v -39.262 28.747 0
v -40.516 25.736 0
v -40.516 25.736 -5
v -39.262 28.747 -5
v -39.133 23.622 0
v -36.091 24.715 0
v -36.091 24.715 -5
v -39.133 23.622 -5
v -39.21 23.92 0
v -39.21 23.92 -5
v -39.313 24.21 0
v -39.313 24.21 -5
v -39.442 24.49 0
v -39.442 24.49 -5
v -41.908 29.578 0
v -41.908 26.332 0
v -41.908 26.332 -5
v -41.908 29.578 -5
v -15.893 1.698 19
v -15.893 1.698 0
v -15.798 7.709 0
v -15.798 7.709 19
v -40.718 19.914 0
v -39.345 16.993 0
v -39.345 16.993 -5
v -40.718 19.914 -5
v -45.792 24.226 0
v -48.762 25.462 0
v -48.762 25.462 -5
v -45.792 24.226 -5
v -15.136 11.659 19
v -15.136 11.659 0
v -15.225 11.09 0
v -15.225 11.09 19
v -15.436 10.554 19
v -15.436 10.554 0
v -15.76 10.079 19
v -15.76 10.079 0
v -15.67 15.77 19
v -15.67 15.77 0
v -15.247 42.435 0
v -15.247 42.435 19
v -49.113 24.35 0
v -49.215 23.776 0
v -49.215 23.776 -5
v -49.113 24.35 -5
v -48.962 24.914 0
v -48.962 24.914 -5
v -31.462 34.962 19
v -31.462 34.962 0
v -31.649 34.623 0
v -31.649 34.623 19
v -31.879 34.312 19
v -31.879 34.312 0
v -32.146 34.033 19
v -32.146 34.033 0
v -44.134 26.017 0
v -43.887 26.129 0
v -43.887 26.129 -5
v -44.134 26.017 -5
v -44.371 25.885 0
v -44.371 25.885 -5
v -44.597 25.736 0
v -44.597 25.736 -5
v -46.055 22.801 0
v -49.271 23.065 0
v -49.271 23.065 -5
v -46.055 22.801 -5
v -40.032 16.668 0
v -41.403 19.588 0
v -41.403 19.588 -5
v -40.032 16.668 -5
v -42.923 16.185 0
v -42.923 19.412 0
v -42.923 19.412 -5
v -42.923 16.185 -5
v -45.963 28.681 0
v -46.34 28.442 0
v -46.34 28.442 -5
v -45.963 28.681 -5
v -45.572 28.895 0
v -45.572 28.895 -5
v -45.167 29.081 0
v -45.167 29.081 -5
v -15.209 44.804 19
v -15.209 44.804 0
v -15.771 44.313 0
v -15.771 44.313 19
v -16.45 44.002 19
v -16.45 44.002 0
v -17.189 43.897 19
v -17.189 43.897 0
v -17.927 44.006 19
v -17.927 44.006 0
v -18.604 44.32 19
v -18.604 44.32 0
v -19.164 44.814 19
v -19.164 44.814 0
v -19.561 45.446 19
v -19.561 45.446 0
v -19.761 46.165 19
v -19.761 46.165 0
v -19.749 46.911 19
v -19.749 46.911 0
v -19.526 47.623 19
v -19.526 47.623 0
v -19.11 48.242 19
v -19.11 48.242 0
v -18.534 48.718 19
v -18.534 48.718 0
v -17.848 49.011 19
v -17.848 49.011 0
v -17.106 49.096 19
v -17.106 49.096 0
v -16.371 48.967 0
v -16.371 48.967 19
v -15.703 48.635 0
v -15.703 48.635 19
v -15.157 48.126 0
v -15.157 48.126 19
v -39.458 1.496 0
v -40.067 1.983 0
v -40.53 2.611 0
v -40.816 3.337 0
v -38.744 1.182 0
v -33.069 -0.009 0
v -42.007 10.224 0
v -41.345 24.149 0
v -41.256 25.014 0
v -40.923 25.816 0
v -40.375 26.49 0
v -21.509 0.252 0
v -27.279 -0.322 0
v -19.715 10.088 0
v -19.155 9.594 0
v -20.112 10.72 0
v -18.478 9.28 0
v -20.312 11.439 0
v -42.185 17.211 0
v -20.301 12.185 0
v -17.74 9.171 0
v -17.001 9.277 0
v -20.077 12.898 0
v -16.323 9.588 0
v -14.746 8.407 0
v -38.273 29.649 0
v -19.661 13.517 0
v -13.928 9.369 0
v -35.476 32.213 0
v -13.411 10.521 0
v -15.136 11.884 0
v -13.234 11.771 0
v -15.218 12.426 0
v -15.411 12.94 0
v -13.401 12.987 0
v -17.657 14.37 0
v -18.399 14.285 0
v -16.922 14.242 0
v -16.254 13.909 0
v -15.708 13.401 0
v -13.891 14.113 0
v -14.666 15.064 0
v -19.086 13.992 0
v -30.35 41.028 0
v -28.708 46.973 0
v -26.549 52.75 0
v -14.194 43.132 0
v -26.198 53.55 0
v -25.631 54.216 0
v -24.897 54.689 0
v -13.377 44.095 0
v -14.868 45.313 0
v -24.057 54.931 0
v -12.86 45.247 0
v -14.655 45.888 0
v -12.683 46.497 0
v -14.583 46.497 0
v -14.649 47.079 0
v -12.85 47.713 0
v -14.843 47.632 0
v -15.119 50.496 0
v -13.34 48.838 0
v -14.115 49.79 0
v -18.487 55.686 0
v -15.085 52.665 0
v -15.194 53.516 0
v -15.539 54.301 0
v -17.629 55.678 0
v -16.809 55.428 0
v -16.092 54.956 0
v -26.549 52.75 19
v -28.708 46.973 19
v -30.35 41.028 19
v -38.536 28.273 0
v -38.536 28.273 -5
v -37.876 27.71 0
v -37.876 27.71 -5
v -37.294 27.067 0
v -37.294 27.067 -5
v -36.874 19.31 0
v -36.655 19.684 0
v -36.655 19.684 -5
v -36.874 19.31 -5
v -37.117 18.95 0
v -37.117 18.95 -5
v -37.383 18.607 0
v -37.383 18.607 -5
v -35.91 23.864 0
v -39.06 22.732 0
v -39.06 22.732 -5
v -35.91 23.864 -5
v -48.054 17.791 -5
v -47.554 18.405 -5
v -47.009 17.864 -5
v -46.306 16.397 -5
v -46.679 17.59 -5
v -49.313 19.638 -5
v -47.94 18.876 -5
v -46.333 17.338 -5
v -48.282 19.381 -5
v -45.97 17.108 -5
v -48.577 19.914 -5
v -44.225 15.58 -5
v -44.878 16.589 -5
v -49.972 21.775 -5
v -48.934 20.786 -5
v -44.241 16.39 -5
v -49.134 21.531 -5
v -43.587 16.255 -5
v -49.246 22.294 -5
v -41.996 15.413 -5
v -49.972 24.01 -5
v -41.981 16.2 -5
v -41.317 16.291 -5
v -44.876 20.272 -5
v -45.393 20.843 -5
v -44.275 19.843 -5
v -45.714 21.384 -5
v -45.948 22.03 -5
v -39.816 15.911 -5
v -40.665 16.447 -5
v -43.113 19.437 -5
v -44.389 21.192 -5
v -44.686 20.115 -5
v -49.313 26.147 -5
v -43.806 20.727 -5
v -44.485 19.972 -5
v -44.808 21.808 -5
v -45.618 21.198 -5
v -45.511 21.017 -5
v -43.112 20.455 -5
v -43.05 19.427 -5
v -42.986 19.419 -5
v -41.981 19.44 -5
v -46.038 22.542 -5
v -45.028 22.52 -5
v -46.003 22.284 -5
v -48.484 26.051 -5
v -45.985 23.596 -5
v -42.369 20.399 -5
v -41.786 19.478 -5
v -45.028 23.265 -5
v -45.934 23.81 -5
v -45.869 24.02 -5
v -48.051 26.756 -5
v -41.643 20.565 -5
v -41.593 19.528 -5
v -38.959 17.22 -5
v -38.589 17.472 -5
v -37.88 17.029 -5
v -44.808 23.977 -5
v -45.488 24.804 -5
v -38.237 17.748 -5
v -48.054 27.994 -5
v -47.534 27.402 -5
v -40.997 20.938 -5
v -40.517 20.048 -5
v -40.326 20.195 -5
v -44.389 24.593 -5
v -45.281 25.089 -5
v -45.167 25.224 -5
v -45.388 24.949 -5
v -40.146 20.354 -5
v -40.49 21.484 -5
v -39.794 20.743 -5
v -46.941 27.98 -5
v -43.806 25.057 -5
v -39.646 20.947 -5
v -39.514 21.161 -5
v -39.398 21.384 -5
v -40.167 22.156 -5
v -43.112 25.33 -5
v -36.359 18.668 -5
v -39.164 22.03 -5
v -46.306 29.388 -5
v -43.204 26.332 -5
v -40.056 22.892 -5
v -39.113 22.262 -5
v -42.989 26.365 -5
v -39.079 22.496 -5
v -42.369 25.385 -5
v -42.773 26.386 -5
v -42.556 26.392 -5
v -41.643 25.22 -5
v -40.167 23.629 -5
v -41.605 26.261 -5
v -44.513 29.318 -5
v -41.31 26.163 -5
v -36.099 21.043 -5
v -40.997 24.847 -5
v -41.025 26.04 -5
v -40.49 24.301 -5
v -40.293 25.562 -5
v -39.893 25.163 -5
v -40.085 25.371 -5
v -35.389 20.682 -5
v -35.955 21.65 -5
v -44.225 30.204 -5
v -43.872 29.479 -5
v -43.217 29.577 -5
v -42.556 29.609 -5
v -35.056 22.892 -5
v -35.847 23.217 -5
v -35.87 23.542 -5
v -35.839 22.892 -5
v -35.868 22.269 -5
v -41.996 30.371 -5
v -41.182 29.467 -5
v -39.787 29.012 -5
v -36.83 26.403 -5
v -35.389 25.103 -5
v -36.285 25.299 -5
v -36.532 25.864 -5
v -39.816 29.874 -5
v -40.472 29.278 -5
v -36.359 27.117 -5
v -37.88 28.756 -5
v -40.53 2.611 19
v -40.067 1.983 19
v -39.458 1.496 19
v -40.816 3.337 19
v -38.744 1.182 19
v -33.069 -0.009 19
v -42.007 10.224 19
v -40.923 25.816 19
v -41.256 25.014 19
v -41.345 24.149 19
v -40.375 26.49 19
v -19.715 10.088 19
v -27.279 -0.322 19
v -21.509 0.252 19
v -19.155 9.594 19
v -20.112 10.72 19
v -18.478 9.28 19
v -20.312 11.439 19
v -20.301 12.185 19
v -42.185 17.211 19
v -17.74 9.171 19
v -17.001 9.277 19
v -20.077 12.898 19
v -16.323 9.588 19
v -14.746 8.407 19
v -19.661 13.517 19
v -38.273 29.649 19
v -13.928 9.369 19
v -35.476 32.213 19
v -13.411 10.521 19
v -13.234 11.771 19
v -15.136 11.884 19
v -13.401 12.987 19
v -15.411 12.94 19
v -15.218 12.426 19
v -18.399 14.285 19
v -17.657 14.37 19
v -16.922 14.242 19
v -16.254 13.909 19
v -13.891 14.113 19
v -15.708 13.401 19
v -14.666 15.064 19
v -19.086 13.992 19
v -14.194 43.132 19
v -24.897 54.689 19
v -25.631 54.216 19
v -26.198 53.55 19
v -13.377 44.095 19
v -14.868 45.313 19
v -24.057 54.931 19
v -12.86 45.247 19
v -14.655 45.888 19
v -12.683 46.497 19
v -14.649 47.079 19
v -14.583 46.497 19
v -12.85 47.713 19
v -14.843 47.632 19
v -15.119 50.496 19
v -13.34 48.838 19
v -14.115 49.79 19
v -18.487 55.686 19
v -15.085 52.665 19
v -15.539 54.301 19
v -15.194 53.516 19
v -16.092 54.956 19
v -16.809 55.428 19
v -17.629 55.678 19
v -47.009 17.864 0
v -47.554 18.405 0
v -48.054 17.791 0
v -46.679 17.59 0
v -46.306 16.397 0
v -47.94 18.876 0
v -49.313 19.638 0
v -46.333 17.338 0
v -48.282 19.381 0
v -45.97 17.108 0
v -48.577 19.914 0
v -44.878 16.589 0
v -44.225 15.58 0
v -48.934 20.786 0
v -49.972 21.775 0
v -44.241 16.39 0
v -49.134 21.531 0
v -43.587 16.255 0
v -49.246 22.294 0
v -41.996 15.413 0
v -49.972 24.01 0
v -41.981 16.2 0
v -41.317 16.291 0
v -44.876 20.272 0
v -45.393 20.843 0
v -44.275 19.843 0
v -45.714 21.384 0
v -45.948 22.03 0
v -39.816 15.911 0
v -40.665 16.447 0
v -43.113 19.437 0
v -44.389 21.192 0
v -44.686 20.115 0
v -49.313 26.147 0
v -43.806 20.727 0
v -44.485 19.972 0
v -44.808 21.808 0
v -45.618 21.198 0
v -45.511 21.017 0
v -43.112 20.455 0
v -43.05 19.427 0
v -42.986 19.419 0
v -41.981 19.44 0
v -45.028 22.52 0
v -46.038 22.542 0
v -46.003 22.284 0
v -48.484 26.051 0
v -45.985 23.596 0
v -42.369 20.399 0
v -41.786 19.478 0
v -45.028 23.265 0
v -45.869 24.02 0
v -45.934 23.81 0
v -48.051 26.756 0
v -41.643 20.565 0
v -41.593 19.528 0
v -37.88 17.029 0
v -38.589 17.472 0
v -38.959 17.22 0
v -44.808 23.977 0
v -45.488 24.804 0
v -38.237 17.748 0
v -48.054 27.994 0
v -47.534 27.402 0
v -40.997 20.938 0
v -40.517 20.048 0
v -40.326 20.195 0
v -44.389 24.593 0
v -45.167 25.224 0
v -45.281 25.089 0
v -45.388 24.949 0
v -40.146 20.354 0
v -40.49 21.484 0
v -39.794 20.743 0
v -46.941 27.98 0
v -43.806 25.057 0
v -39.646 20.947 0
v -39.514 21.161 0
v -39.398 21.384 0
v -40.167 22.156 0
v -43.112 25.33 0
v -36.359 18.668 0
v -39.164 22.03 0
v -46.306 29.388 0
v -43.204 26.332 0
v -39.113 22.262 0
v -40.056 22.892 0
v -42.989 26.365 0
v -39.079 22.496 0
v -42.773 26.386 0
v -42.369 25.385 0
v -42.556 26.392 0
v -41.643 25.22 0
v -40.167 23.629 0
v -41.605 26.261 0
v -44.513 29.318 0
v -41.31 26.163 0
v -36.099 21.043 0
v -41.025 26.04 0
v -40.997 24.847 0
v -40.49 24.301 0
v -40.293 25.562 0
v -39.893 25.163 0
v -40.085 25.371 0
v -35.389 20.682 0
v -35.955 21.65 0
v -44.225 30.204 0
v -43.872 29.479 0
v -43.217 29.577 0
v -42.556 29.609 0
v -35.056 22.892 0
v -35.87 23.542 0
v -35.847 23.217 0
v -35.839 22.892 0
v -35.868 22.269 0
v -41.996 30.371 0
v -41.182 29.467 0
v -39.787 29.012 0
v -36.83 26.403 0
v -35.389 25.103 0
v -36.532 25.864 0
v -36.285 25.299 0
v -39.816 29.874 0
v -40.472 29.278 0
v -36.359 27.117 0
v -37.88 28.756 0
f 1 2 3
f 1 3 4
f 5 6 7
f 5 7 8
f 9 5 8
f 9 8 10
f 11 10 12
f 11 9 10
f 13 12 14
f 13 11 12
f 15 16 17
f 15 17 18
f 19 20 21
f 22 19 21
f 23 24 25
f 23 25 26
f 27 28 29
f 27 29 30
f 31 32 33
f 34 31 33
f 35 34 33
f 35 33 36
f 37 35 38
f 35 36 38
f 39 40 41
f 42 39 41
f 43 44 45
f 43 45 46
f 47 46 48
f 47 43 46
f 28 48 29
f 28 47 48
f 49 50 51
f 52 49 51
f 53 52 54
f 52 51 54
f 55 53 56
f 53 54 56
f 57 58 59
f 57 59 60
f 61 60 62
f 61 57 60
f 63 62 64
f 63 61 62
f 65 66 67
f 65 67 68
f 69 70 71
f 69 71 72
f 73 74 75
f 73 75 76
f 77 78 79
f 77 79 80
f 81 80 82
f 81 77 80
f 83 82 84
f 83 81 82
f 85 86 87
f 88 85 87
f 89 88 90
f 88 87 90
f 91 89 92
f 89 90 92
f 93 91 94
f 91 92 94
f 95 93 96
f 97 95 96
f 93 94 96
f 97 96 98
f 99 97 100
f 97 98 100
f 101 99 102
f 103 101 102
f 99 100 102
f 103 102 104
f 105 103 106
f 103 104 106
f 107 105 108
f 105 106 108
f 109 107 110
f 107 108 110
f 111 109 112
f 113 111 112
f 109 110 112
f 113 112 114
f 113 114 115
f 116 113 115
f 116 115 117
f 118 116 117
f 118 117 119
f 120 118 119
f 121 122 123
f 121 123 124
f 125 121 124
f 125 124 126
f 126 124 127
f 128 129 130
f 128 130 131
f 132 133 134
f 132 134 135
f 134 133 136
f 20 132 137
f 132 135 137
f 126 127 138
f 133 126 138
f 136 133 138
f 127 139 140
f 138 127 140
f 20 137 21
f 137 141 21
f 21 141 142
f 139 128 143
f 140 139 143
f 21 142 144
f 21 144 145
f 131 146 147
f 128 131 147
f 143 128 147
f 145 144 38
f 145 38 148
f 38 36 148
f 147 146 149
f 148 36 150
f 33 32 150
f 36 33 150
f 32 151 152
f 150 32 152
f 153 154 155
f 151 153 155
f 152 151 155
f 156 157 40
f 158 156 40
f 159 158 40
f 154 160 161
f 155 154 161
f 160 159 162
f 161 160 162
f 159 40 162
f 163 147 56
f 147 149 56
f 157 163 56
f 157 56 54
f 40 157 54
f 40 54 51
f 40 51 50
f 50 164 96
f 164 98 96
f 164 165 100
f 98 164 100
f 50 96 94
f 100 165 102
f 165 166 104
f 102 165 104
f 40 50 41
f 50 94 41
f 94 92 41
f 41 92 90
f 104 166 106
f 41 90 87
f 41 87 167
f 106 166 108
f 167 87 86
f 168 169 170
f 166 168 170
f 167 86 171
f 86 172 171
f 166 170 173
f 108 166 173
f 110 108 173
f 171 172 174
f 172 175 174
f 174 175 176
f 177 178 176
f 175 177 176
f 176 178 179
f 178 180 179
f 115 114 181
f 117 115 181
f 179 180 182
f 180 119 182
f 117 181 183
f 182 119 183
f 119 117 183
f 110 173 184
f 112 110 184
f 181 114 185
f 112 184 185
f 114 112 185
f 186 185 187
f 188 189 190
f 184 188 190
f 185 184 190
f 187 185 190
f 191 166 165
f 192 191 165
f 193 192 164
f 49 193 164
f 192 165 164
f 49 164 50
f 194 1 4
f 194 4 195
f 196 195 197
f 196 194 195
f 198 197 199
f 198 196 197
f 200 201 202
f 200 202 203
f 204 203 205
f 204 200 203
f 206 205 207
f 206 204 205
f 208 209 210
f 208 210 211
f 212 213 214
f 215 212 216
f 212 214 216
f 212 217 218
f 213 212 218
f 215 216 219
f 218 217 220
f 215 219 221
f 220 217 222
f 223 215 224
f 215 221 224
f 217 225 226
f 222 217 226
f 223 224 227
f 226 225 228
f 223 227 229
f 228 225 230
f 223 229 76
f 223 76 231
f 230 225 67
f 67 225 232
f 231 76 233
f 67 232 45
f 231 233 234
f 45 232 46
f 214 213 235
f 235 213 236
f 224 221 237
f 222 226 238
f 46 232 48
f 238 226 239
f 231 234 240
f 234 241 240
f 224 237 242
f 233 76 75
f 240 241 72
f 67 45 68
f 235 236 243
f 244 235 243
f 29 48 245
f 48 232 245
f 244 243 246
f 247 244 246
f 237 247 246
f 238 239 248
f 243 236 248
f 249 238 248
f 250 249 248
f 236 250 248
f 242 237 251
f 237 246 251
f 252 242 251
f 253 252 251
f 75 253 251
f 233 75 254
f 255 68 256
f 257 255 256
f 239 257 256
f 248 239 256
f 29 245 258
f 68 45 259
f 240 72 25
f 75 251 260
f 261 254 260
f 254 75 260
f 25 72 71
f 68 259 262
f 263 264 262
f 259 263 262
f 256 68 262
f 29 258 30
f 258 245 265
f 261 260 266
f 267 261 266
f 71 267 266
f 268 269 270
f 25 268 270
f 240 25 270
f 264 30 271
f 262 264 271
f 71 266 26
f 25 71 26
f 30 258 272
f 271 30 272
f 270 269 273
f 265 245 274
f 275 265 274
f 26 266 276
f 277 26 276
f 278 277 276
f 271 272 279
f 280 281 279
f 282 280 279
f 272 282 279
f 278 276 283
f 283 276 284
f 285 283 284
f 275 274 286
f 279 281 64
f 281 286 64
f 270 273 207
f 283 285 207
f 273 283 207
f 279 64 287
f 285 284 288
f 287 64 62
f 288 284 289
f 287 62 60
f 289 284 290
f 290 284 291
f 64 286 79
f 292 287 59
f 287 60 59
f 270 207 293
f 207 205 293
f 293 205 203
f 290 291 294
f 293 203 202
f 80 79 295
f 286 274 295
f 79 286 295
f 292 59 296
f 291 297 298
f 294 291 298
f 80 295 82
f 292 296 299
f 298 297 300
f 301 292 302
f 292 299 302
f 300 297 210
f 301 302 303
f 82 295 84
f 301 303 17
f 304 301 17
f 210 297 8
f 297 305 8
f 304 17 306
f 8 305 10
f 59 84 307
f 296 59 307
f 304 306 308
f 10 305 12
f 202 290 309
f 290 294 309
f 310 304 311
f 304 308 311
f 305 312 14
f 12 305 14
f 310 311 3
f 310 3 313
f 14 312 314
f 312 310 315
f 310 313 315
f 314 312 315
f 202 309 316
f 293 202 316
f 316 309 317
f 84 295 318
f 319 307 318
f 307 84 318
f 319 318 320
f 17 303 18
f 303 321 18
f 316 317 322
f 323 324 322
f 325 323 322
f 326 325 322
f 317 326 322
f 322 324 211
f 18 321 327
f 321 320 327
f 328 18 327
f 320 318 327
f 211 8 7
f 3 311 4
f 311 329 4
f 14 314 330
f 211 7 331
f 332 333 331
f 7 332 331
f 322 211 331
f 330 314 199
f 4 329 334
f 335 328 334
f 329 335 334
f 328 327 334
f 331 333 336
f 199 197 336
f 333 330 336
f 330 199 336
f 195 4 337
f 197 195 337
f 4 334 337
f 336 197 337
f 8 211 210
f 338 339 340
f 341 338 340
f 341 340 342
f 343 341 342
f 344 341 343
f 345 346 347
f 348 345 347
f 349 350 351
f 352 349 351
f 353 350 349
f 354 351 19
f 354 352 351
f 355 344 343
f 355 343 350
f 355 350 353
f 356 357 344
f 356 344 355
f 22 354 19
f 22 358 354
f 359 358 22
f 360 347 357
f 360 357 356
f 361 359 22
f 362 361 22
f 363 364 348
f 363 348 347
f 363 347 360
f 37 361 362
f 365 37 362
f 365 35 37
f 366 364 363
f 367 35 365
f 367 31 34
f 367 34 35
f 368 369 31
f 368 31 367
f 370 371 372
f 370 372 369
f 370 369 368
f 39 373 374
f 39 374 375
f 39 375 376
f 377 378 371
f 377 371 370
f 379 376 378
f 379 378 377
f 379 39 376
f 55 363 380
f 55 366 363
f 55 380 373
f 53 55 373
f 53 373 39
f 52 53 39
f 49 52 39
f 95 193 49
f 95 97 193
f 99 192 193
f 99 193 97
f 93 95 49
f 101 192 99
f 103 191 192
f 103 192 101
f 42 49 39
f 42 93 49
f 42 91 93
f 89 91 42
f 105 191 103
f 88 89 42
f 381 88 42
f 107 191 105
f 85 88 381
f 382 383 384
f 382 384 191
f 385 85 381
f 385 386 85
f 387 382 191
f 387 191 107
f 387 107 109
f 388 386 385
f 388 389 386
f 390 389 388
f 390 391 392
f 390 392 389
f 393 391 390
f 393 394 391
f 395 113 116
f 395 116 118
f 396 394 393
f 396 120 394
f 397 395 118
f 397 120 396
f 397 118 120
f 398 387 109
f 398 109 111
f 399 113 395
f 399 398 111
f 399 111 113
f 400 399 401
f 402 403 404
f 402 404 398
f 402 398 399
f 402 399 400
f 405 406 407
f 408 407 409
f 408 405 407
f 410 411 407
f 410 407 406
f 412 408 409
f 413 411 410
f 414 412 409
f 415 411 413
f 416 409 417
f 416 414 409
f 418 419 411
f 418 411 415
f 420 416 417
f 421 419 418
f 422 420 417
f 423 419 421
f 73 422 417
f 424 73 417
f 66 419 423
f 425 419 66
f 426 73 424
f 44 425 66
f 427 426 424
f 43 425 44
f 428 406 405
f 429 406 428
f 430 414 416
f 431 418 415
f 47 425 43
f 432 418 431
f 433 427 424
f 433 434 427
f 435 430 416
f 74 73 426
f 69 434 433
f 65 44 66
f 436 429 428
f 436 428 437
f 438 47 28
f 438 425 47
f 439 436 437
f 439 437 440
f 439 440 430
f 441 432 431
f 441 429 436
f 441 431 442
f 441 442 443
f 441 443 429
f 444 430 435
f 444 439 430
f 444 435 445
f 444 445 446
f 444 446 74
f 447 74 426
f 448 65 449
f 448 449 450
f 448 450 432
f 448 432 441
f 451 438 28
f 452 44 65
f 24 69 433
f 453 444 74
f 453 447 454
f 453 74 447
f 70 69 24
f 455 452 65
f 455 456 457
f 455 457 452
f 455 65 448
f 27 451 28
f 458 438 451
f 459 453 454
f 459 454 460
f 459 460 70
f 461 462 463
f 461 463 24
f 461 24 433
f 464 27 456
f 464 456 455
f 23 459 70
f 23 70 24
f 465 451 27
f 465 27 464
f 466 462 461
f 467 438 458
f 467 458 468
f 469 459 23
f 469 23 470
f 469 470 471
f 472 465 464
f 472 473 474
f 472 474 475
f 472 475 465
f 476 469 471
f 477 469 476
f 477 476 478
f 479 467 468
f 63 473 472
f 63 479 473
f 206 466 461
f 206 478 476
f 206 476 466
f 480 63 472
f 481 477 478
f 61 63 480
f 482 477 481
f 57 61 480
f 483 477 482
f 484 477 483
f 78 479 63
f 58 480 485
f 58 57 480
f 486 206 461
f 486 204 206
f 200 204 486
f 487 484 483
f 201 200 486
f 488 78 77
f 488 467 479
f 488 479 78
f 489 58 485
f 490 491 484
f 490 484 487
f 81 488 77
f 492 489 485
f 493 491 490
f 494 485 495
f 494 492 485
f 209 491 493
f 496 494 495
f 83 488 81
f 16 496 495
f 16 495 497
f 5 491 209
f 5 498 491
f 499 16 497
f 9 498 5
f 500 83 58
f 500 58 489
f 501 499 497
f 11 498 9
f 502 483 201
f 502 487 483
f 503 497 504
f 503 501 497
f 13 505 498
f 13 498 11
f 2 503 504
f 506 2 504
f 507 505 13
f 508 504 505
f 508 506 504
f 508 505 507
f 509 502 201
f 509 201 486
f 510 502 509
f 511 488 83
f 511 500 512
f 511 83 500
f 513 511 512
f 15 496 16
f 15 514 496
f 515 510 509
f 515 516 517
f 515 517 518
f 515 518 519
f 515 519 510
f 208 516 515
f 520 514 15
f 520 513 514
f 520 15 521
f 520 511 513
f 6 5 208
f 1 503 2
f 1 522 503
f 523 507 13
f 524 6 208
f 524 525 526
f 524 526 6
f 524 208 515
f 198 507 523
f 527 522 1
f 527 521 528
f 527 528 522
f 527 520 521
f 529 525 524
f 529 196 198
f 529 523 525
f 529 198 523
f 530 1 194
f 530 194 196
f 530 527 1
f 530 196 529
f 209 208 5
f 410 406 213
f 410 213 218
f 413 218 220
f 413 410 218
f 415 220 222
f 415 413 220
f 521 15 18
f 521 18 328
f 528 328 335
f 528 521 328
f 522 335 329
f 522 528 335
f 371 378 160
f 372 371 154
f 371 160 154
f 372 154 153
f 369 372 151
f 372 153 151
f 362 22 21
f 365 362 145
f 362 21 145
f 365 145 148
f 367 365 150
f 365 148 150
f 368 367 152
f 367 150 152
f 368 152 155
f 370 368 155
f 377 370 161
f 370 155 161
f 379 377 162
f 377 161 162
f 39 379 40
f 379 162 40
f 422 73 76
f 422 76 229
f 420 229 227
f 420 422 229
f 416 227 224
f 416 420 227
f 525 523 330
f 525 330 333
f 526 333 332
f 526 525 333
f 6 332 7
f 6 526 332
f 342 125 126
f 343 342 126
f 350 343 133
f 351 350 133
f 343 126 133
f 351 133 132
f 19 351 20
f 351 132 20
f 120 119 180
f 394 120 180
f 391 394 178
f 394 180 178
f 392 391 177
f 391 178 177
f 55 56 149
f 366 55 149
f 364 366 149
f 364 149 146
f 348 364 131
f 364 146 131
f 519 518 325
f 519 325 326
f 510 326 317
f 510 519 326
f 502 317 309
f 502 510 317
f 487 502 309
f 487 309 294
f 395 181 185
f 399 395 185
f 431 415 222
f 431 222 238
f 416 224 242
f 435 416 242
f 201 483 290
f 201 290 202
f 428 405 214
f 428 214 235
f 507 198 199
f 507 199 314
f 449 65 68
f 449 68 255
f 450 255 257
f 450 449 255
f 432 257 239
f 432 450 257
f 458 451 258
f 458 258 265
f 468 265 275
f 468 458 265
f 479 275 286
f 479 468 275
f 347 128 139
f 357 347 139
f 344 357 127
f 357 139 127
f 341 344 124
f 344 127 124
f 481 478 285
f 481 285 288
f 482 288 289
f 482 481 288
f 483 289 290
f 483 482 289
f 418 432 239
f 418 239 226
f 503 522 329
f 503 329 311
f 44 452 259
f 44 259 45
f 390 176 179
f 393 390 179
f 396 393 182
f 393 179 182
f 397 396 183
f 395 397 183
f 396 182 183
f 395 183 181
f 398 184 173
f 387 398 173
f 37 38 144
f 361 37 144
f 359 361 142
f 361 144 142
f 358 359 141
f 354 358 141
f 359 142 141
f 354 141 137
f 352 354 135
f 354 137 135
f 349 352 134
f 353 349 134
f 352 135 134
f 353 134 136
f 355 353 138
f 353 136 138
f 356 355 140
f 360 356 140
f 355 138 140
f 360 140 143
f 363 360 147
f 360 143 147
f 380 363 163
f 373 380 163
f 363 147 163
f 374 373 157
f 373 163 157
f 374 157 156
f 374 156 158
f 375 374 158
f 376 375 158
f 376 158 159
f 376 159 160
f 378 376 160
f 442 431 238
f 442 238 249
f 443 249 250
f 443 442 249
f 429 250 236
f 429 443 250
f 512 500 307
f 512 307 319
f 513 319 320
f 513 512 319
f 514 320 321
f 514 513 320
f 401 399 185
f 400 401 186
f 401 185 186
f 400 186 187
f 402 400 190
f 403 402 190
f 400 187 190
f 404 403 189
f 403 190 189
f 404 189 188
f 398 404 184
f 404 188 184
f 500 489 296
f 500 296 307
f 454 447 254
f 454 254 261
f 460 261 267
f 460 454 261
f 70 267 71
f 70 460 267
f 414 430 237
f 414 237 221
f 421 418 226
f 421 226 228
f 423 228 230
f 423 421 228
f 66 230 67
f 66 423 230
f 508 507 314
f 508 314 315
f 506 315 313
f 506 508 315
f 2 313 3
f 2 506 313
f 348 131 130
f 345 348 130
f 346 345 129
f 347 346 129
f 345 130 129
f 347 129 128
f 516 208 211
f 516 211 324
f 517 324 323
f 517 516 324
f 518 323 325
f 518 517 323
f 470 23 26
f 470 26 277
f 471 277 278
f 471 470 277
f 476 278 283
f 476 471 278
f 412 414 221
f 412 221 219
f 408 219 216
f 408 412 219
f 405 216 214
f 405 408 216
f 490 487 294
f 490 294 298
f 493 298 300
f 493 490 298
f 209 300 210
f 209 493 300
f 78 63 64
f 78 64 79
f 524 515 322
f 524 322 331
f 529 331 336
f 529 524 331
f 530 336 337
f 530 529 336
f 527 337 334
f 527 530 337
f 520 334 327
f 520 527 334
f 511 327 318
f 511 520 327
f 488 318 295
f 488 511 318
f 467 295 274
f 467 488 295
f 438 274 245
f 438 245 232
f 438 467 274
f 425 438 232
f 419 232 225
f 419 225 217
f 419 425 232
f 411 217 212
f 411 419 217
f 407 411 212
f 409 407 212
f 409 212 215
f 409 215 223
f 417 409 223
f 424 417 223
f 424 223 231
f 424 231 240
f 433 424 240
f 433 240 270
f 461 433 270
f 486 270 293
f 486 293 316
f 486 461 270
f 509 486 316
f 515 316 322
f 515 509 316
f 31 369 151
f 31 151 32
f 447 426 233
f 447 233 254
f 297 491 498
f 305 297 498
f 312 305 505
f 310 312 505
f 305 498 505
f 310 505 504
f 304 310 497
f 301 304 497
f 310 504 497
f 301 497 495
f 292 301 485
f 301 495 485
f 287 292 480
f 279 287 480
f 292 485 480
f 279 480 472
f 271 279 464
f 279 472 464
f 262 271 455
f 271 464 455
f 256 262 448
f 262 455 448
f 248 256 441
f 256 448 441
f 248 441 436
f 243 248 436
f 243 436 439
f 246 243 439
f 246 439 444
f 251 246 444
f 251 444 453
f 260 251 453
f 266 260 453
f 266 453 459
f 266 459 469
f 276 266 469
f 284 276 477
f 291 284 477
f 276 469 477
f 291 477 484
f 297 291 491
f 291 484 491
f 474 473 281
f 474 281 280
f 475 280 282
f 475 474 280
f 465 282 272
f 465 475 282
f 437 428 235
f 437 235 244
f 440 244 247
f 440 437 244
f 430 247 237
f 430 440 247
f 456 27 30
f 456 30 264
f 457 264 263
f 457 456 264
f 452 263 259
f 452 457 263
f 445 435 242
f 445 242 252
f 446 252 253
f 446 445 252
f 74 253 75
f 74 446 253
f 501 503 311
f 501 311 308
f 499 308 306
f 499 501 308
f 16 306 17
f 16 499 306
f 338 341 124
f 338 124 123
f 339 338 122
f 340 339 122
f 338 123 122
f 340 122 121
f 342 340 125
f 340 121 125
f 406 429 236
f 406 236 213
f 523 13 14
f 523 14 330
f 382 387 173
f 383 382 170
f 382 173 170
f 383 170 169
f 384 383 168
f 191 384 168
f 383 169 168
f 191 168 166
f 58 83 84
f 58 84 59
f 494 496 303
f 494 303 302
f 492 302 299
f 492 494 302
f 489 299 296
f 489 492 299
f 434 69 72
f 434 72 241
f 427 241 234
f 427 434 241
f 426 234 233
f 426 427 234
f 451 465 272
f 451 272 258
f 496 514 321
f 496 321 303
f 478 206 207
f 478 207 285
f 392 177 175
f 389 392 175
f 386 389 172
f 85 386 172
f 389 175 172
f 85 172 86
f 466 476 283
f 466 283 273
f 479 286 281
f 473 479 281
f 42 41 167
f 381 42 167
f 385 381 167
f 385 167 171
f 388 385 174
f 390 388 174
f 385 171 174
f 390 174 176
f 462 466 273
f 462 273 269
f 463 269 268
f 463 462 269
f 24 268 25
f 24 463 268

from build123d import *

# Parameters (mm, degrees)
F1_DEPTH = 19
F2_R     = 7.5
F2_R_2   = 2.5
F3_DEPTH = 5


# Not quite as in the source:
# - a feature names something its author has since deleted; it is built from what else it names


with BuildPart() as f1:
    # F0 (on Top) → F1 (new body)
    with BuildSketch(Plane.XY):
        with BuildLine():
            Line((-18.4867138529, 55.6857541377), (-24.0573941449, 54.93137017))
            ThreePointArc((-24.0573941449, 54.93137017), (-25.6311486072, 54.2155115142), (-26.5485038183, 52.7500367996))
            ThreePointArc((-26.5485038183, 52.7500367996), (-29.5944451056, 44.0185448748), (-31.46174181, 34.9615082415))
            ThreePointArc((-31.46174181, 34.9615082415), (-31.7590054988, 34.4640245193), (-32.1463756641, 34.032979151))
            ThreePointArc((-32.1463756641, 34.032979151), (-36.9518125946, 31.0156700781), (-40.3745702721, 26.4900642606))
            ThreePointArc((-40.3745702721, 26.4900642606), (-41.1187881848, 25.4271596859), (-41.3445519166, 24.1494049466))
            ThreePointArc((-41.3445519166, 24.1494049466), (-42.2235056982, 13.7140274197), (-40.8158360427, 3.3367382737))
            ThreePointArc((-40.8158360427, 3.3367382737), (-40.0672712074, 1.9827956506), (-38.7436286277, 1.181871022))
            ThreePointArc((-38.7436286277, 1.181871022), (-27.2787715313, -0.3216500473), (-15.8934134801, 1.6975443206))
            Line((-15.8934134801, 1.6975443206), (-15.7980047108, 7.7090638021))
            ThreePointArc((-15.7980047108, 7.7090638021), (-22.2332162759, 11.8428335239), (-15.670064806, 15.7703063478))
            Line((-15.670064806, 15.7703063478), (-15.2468750991, 42.4346600078))
            ThreePointArc((-15.2468750991, 42.4346600078), (-21.6820866642, 46.5684297296), (-15.1189351942, 50.4959025535))
            Line((-15.1189351942, 50.4959025535), (-15.0845049847, 52.6652825485))
            ThreePointArc((-15.0845049847, 52.6652825485), (-16.0924041894, 54.9563331626), (-18.4867138529, 55.6857541377))
        make_face()
        with BuildLine():
            ThreePointArc((-12.6826533059, 46.4970192649), (-13.3396901586, 48.8383082793), (-15.1189351942, 50.4959025535))
            Line((-15.1189351942, 50.4959025535), (-15.1565415969, 48.1263968586))
            ThreePointArc((-15.1565415969, 48.1263968586), (-14.7303186587, 47.3607638906), (-14.5826533059, 46.4970192649))
            ThreePointArc((-14.5826533059, 46.4970192649), (-14.7443342143, 45.5944673231), (-15.2092686964, 44.8041657027))
            Line((-15.2092686964, 44.8041657027), (-15.2468750991, 42.4346600078))
            ThreePointArc((-15.2468750991, 42.4346600078), (-13.377327963, 44.0950411146), (-12.6826533059, 46.4970192649))
        make_face()
        with BuildLine():
            Line((-15.1565415969, 48.1263968586), (-15.1189351942, 50.4959025535))
            ThreePointArc((-15.1189351942, 50.4959025535), (-21.6820866642, 46.5684297296), (-15.2468750991, 42.4346600078))
            Line((-15.2468750991, 42.4346600078), (-15.2092686964, 44.8041657027))
            ThreePointArc((-15.2092686964, 44.8041657027), (-19.7823259129, 46.5382786445), (-15.1565415969, 48.1263968586))
        make_face()
        with BuildLine():
            Line((-15.7076712086, 13.4008006529), (-15.670064806, 15.7703063478))
            ThreePointArc((-15.670064806, 15.7703063478), (-22.2332162759, 11.8428335239), (-15.7980047108, 7.7090638021))
            Line((-15.7980047108, 7.7090638021), (-15.7603983081, 10.0785694971))
            ThreePointArc((-15.7603983081, 10.0785694971), (-20.3334555246, 11.8126824388), (-15.7076712086, 13.4008006529))
        make_face()
        with BuildLine():
            ThreePointArc((-13.2337829176, 11.7714230593), (-13.8908197703, 14.1127120736), (-15.670064806, 15.7703063478))
            Line((-15.670064806, 15.7703063478), (-15.7076712086, 13.4008006529))
            ThreePointArc((-15.7076712086, 13.4008006529), (-15.3007413769, 12.6881066805), (-15.1362247549, 11.8840800221))
            Line((-15.1362247549, 11.8840800221), (-15.1362247549, 11.6587660965))
            ThreePointArc((-15.1362247549, 11.6587660965), (-15.3155945916, 10.8162449502), (-15.7603983081, 10.0785694971))
            Line((-15.7603983081, 10.0785694971), (-15.7980047108, 7.7090638021))
            ThreePointArc((-15.7980047108, 7.7090638021), (-13.9284575747, 9.3694449089), (-13.2337829176, 11.7714230593))
        make_face()
    extrude(amount=F1_DEPTH)


with BuildPart() as f3:
    # F2 (on Top) → F3 (new body)
    with BuildSketch(Plane.XY):
        with Locations((-42.5560415272, 22.8924162194)):
            Circle(F2_R)
        with BuildLine():
            ThreePointArc((-36.829554944, 26.4032928604), (-36.4020595038, 25.5845173749), (-36.0909286598, 24.7148374079))
            ThreePointArc((-36.0909286598, 24.7148374079), (-35.9865291403, 24.2925627739), (-35.9096801821, 23.8644163459))
            ThreePointArc((-35.9096801821, 23.8644163459), (-35.8566790413, 23.3797001801), (-35.8389809069, 22.8924162194))
            ThreePointArc((-35.8389809069, 22.8924162194), (-35.9042334364, 21.9584180933), (-36.0987232404, 21.0425665179))
            ThreePointArc((-36.0987232404, 21.0425665179), (-36.3395382025, 20.3480125978), (-36.6548093118, 19.6839334447))
            ThreePointArc((-36.6548093118, 19.6839334447), (-36.992942718, 19.1279992639), (-37.3832803945, 18.6073904739))
            ThreePointArc((-37.3832803945, 18.6073904739), (-37.7906796134, 18.1584718591), (-38.2368936112, 17.7481121212))
            ThreePointArc((-38.2368936112, 17.7481121212), (-38.7721055408, 17.3425755167), (-39.3451335754, 16.9925032116))
            ThreePointArc((-39.3451335754, 16.9925032116), (-39.6838378223, 16.8204026117), (-40.0317304914, 16.6677268962))
            ThreePointArc((-40.0317304914, 16.6677268962), (-40.9887550369, 16.3607612658), (-41.9808680572, 16.2000265973))
            ThreePointArc((-41.9808680572, 16.2000265973), (-42.4514489154, 16.1761699642), (-42.9225444398, 16.1853617996))
            ThreePointArc((-42.9225444398, 16.1853617996), (-43.9153904074, 16.3143409692), (-44.8780365625, 16.589461164))
            ThreePointArc((-44.8780365625, 16.589461164), (-45.435948651, 16.8240524916), (-45.9704801387, 17.1079099879))
            ThreePointArc((-45.9704801387, 17.1079099879), (-46.5079882683, 17.4609320456), (-47.0092746326, 17.8637366429))
            ThreePointArc((-47.0092746326, 17.8637366429), (-47.2892940825, 18.1263671615), (-47.5538518611, 18.4045664847))
            ThreePointArc((-47.5538518611, 18.4045664847), (-48.116773764, 19.1245042824), (-48.5767615095, 19.9141895206))
            ThreePointArc((-48.5767615095, 19.9141895206), (-48.7708001482, 20.3437540886), (-48.9342357685, 20.7858689034))
            ThreePointArc((-48.9342357685, 20.7858689034), (-49.2009974057, 21.910853818), (-49.2708867143, 23.0649198099))
            ThreePointArc((-49.2708867143, 23.0649198099), (-49.2522737571, 23.4209777562), (-49.2147939886, 23.7755464664))
            ThreePointArc((-49.2147939886, 23.7755464664), (-49.043482284, 24.6336846657), (-48.7620670518, 25.4622704105))
            ThreePointArc((-48.7620670518, 25.4622704105), (-48.630264893, 25.7599437045), (-48.4841948015, 26.0508813738))
            ThreePointArc((-48.4841948015, 26.0508813738), (-47.8022969745, 27.0871399477), (-46.9414713871, 27.9803340961))
            ThreePointArc((-46.9414713871, 27.9803340961), (-46.6471161076, 28.2198933102), (-46.3397008388, 28.4424455517))
            ThreePointArc((-46.3397008388, 28.4424455517), (-45.76910866, 28.7911536246), (-45.1666718224, 29.0813994023))
            ThreePointArc((-45.1666718224, 29.0813994023), (-44.8430367604, 29.2081549869), (-44.5132782297, 29.3180000735))
            ThreePointArc((-44.5132782297, 29.3180000735), (-43.5454522375, 29.536208045), (-42.5560415272, 29.6094768397))
            ThreePointArc((-42.5560415272, 29.6094768397), (-42.231677867, 29.6016405853), (-41.9080710248, 29.5781501061))
            ThreePointArc((-41.9080710248, 29.5781501061), (-40.8244371879, 29.3824431676), (-39.7873399477, 29.012317766))
            ThreePointArc((-39.7873399477, 29.012317766), (-39.5219662451, 28.8851860764), (-39.2624151007, 28.7465539304))
            ThreePointArc((-39.2624151007, 28.7465539304), (-38.1965318152, 28.0025608795), (-37.2939053957, 27.0672008498))
            ThreePointArc((-37.2939053957, 27.0672008498), (-37.0517113458, 26.7422542199), (-36.829554944, 26.4032928604))
        make_face(mode=Mode.SUBTRACT)
        with BuildLine():
            Line((-36.0987232404, 21.0425665179), (-39.1638805296, 22.0303003532))
            ThreePointArc((-39.1638805296, 22.0303003532), (-39.2648640734, 21.7015547799), (-39.3976232849, 21.3843067384))
            Line((-39.3976232849, 21.3843067384), (-36.6548093118, 19.6839334447))
            ThreePointArc((-36.6548093118, 19.6839334447), (-36.3395382025, 20.3480125978), (-36.0987232404, 21.0425665179))
        make_face()
        with BuildLine():
            ThreePointArc((-39.132827379, 23.6215286224), (-39.0752909243, 23.2589885054), (-39.0560415272, 22.8924162194))
            ThreePointArc((-39.0560415272, 22.8924162194), (-39.0569583824, 22.8123091265), (-39.0597084679, 22.732244003))
            Line((-39.0597084679, 22.732244003), (-35.9096801821, 23.8644163459))
            ThreePointArc((-35.9096801821, 23.8644163459), (-35.9865291403, 24.2925627739), (-36.0909286598, 24.7148374079))
            Line((-36.0909286598, 24.7148374079), (-39.132827379, 23.6215286224))
        make_face()
        with BuildLine():
            ThreePointArc((-39.8927436716, 25.163284893), (-39.6476626206, 24.8395505589), (-39.4417244656, 24.4896103968))
            Line((-39.4417244656, 24.4896103968), (-36.829554944, 26.4032928604))
            ThreePointArc((-36.829554944, 26.4032928604), (-37.0517113458, 26.7422542199), (-37.2939053957, 27.0672008498))
            Line((-37.2939053957, 27.0672008498), (-39.8927436716, 25.163284893))
        make_face()
        with BuildLine():
            ThreePointArc((-39.0597084679, 22.732244003), (-39.0569583824, 22.8123091265), (-39.0560415272, 22.8924162194))
            ThreePointArc((-39.0560415272, 22.8924162194), (-39.0752909243, 23.2589885054), (-39.132827379, 23.6215286224))
            ThreePointArc((-39.132827379, 23.6215286224), (-39.2585849208, 24.0657788782), (-39.4417244656, 24.4896103968))
            ThreePointArc((-39.4417244656, 24.4896103968), (-39.6476626206, 24.8395505589), (-39.8927436716, 25.163284893))
            ThreePointArc((-39.8927436716, 25.163284893), (-40.1868435925, 25.4686346004), (-40.515704619, 25.7361857779))
            ThreePointArc((-40.515704619, 25.7361857779), (-40.763863783, 25.8987593358), (-41.024899288, 26.0397330836))
            ThreePointArc((-41.024899288, 26.0397330836), (-41.4567348008, 26.2152952003), (-41.9080710248, 26.3319124366))
            ThreePointArc((-41.9080710248, 26.3319124366), (-42.2306469668, 26.3772574468), (-42.5560415272, 26.3924162194))
            ThreePointArc((-42.5560415272, 26.3924162194), (-42.8814360875, 26.3772574468), (-43.2040120295, 26.3319124366))
            ThreePointArc((-43.2040120295, 26.3319124366), (-43.5508479772, 26.2480622268), (-43.8873439447, 26.1293335606))
            ThreePointArc((-43.8873439447, 26.1293335606), (-44.2536485399, 25.9531563963), (-44.5970572739, 25.7356986046))
            ThreePointArc((-44.5970572739, 25.7356986046), (-44.8959140549, 25.4952985745), (-45.1666718224, 25.2236411038))
            ThreePointArc((-45.1666718224, 25.2236411038), (-45.3353778089, 25.0196890822), (-45.4881886835, 24.8035711199))
            ThreePointArc((-45.4881886835, 24.8035711199), (-45.6536452917, 24.5217875454), (-45.7921014478, 24.2258014563))
            ThreePointArc((-45.7921014478, 24.2258014563), (-45.9031313374, 23.9156414157), (-45.9845082279, 23.5964162775))
            ThreePointArc((-45.9845082279, 23.5964162775), (-46.0424319056, 23.2007701216), (-46.0548500683, 22.8010992291))
            ThreePointArc((-46.0548500683, 22.8010992291), (-46.0230139848, 22.4127267598), (-45.9482025247, 22.0303003532))
            ThreePointArc((-45.9482025247, 22.0303003532), (-45.8472189809, 21.7015547799), (-45.7144597694, 21.3843067384))
            ThreePointArc((-45.7144597694, 21.3843067384), (-45.5661116717, 21.1065053244), (-45.3933928705, 20.8431633424))
            ThreePointArc((-45.3933928705, 20.8431633424), (-45.1504482326, 20.543149558), (-44.875940706, 20.2717163511))
            ThreePointArc((-44.875940706, 20.2717163511), (-44.5866141985, 20.0416663836), (-44.2746392941, 19.8434128224))
            ThreePointArc((-44.2746392941, 19.8434128224), (-43.7117052617, 19.5887150628), (-43.112755495, 19.4369756458))
            ThreePointArc((-43.112755495, 19.4369756458), (-43.0178235038, 19.4230131864), (-42.9225444398, 19.4116583113))
            ThreePointArc((-42.9225444398, 19.4116583113), (-42.4507482802, 19.3940003877), (-41.9808680572, 19.4400003292))
            ThreePointArc((-41.9808680572, 19.4400003292), (-41.6889373989, 19.501526892), (-41.4033071565, 19.5876918027))
            ThreePointArc((-41.4033071565, 19.5876918027), (-41.0515300083, 19.7322825056), (-40.7175188239, 19.9141895206))
            ThreePointArc((-40.7175188239, 19.9141895206), (-40.4204666328, 20.1194539279), (-40.1461427954, 20.3542302328))
            ThreePointArc((-40.1461427954, 20.3542302328), (-39.9626809244, 20.5419948138), (-39.7938083043, 20.742981963))
            ThreePointArc((-39.7938083043, 20.742981963), (-39.5783993711, 21.0529469508), (-39.3976232849, 21.3843067384))
            ThreePointArc((-39.3976232849, 21.3843067384), (-39.2648640734, 21.7015547799), (-39.1638805296, 22.0303003532))
            ThreePointArc((-39.1638805296, 22.0303003532), (-39.0939585105, 22.3786252254), (-39.0597084679, 22.732244003))
        make_face()
        with Locations((-42.5560415272, 22.8924162194)):
            Circle(F2_R_2, mode=Mode.SUBTRACT)
        with BuildLine():
            ThreePointArc((-41.024899288, 26.0397330836), (-40.763863783, 25.8987593358), (-40.515704619, 25.7361857779))
            Line((-40.515704619, 25.7361857779), (-39.2624151007, 28.7465539304))
            ThreePointArc((-39.2624151007, 28.7465539304), (-39.5219662451, 28.8851860764), (-39.7873399477, 29.012317766))
            Line((-39.7873399477, 29.012317766), (-41.024899288, 26.0397330836))
        make_face()
        with BuildLine():
            ThreePointArc((-43.8873439447, 26.1293335606), (-43.5508479772, 26.2480622268), (-43.2040120295, 26.3319124366))
            Line((-43.2040120295, 26.3319124366), (-44.5132782297, 29.3180000735))
            ThreePointArc((-44.5132782297, 29.3180000735), (-44.8430367604, 29.2081549869), (-45.1666718224, 29.0813994023))
            Line((-45.1666718224, 29.0813994023), (-43.8873439447, 26.1293335606))
        make_face()
        with BuildLine():
            ThreePointArc((-45.1666718224, 25.2236411038), (-44.8959140549, 25.4952985745), (-44.5970572739, 25.7356986046))
            Line((-44.5970572739, 25.7356986046), (-46.3397008388, 28.4424455517))
            ThreePointArc((-46.3397008388, 28.4424455517), (-46.6471161076, 28.2198933102), (-46.9414713871, 27.9803340961))
            Line((-46.9414713871, 27.9803340961), (-45.1666718224, 25.2236411038))
        make_face()
        with BuildLine():
            ThreePointArc((-46.0548500683, 22.8010992291), (-46.0424319056, 23.2007701216), (-45.9845082279, 23.5964162775))
            Line((-45.9845082279, 23.5964162775), (-49.2147939886, 23.7755464664))
            ThreePointArc((-49.2147939886, 23.7755464664), (-49.2522737571, 23.4209777562), (-49.2708867143, 23.0649198099))
            Line((-49.2708867143, 23.0649198099), (-46.0548500683, 22.8010992291))
        make_face()
        with BuildLine():
            Line((-48.5767615095, 19.9141895206), (-45.7144597694, 21.3843067384))
            ThreePointArc((-45.7144597694, 21.3843067384), (-45.8472189809, 21.7015547799), (-45.9482025247, 22.0303003532))
            Line((-45.9482025247, 22.0303003532), (-48.9342357685, 20.7858689034))
            ThreePointArc((-48.9342357685, 20.7858689034), (-48.7708001482, 20.3437540886), (-48.5767615095, 19.9141895206))
        make_face()
        with BuildLine():
            Line((-47.0092746326, 17.8637366429), (-44.875940706, 20.2717163511))
            ThreePointArc((-44.875940706, 20.2717163511), (-45.1504482326, 20.543149558), (-45.3933928705, 20.8431633424))
            Line((-45.3933928705, 20.8431633424), (-47.5538518611, 18.4045664847))
            ThreePointArc((-47.5538518611, 18.4045664847), (-47.2892940825, 18.1263671615), (-47.0092746326, 17.8637366429))
        make_face()
        with BuildLine():
            Line((-44.8780365625, 16.589461164), (-43.112755495, 19.4369756458))
            ThreePointArc((-43.112755495, 19.4369756458), (-43.7117052617, 19.5887150628), (-44.2746392941, 19.8434128224))
            Line((-44.2746392941, 19.8434128224), (-45.9704801387, 17.1079099879))
            ThreePointArc((-45.9704801387, 17.1079099879), (-45.435948651, 16.8240524916), (-44.8780365625, 16.589461164))
        make_face()
        with BuildLine():
            ThreePointArc((-42.5560415272, 26.3924162194), (-42.2306469668, 26.3772574468), (-41.9080710248, 26.3319124366))
            Line((-41.9080710248, 26.3319124366), (-41.9080710248, 29.5781501061))
            ThreePointArc((-41.9080710248, 29.5781501061), (-42.231677867, 29.6016405853), (-42.5560415272, 29.6094768397))
            Line((-42.5560415272, 29.6094768397), (-42.5560415272, 26.3924162194))
        make_face()
        with BuildLine():
            Line((-41.9808680572, 16.2000265973), (-41.9808680572, 19.4400003292))
            ThreePointArc((-41.9808680572, 19.4400003292), (-42.4507482802, 19.3940003877), (-42.9225444398, 19.4116583113))
            Line((-42.9225444398, 19.4116583113), (-42.9225444398, 16.1853617996))
            ThreePointArc((-42.9225444398, 16.1853617996), (-42.4514489154, 16.1761699642), (-41.9808680572, 16.2000265973))
        make_face()
        with BuildLine():
            Line((-39.3451335754, 16.9925032116), (-40.7175188239, 19.9141895206))
            ThreePointArc((-40.7175188239, 19.9141895206), (-41.0515300083, 19.7322825056), (-41.4033071565, 19.5876918027))
            Line((-41.4033071565, 19.5876918027), (-40.0317304914, 16.6677268962))
            ThreePointArc((-40.0317304914, 16.6677268962), (-39.6838378223, 16.8204026117), (-39.3451335754, 16.9925032116))
        make_face()
        with BuildLine():
            Line((-37.3832803945, 18.6073904739), (-39.7938083043, 20.742981963))
            ThreePointArc((-39.7938083043, 20.742981963), (-39.9626809244, 20.5419948138), (-40.1461427954, 20.3542302328))
            Line((-40.1461427954, 20.3542302328), (-38.2368936112, 17.7481121212))
            ThreePointArc((-38.2368936112, 17.7481121212), (-37.7906796134, 18.1584718591), (-37.3832803945, 18.6073904739))
        make_face()
        with BuildLine():
            ThreePointArc((-45.7921014478, 24.2258014563), (-45.6536452917, 24.5217875454), (-45.4881886835, 24.8035711199))
            Line((-45.4881886835, 24.8035711199), (-48.4841948015, 26.0508813738))
            ThreePointArc((-48.4841948015, 26.0508813738), (-48.630264893, 25.7599437045), (-48.7620670518, 25.4622704105))
            Line((-48.7620670518, 25.4622704105), (-45.7921014478, 24.2258014563))
        make_face()
    extrude(amount=-F3_DEPTH)


solid = Compound([f1.part, f3.part])
